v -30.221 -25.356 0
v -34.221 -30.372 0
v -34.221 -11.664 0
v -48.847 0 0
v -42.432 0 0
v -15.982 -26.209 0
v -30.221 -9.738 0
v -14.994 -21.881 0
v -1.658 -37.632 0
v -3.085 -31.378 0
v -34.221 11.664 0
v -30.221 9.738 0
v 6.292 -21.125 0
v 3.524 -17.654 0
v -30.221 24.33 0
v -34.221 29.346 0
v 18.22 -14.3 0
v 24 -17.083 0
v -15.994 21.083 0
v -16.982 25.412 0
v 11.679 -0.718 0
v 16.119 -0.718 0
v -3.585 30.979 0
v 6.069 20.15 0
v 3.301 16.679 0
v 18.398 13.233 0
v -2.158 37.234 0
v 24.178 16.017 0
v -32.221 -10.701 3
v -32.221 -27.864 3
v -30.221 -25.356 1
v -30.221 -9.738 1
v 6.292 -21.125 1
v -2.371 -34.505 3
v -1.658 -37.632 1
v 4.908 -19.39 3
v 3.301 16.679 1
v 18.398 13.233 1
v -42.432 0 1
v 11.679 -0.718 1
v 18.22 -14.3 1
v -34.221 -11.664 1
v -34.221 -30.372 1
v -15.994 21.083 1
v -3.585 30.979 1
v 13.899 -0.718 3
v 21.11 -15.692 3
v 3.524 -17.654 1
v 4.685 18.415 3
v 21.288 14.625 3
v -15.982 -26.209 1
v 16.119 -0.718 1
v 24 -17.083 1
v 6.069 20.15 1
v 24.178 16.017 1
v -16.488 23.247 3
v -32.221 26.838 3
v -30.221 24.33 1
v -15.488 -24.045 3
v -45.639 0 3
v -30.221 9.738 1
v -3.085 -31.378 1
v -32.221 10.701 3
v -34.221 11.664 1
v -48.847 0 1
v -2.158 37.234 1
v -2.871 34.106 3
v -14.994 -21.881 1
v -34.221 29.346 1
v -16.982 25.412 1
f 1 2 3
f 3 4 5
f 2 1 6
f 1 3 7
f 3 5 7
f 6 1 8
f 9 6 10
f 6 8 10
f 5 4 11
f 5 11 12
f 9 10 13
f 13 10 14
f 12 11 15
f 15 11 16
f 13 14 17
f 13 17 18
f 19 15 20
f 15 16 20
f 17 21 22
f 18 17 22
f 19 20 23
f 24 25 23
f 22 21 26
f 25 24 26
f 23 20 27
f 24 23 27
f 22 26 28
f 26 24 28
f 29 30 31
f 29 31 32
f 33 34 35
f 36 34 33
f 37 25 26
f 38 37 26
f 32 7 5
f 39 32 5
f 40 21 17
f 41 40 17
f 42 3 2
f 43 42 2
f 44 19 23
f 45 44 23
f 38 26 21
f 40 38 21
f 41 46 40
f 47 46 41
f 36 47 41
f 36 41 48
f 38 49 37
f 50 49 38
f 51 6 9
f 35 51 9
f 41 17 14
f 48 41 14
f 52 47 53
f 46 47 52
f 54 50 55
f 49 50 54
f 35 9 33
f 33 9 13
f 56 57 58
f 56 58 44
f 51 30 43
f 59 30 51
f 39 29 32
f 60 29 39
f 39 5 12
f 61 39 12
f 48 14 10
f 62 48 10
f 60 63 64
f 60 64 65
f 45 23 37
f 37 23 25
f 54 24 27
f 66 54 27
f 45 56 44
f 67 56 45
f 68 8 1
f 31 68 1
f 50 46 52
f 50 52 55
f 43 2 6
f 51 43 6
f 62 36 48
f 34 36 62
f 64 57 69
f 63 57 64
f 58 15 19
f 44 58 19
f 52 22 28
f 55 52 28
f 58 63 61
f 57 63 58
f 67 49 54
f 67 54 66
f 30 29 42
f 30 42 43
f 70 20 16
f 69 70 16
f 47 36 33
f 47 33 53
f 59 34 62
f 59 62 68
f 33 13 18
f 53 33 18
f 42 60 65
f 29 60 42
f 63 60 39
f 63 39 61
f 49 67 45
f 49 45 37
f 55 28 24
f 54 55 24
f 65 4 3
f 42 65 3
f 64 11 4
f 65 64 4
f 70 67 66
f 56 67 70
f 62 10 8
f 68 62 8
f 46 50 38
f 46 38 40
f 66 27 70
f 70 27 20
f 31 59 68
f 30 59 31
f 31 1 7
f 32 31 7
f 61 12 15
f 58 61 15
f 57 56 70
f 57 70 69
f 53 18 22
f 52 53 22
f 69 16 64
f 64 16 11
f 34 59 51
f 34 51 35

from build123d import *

# Parameters (mm, degrees)
F1_DEPTH = 3
F2_SIZE  = 1.99999


# Not quite as in the source:
# - a fillet or chamfer is up to 0.001 mm smaller than in the source, because OpenCascade refuses the exact size


with BuildPart() as f1:
    # F0 (on Top) → F1 (new body)
    with BuildSketch(Plane.XY):
        Polygon((6.0692586303, 20.150212978), (-2.1576516057, 37.2335681107), (-16.982031609, 25.4115195514), (-34.2207515071, 29.346144875), (-34.2207515071, 11.6640991742), (-48.8470692461, 0), (-34.2207515071, -11.6640991742), (-34.2207515071, -30.3718617382), (-15.982031609, -26.2089929403), (-1.6576516057, -37.6323048051), (6.2917795642, -21.1251408902), (24, -17.0833551327), (16.1191004999, -0.7184986964), (24.1784479339, 16.0169086929), align=None)
        Polygon((-42.4315673597, 0), (-30.2207515071, 9.737800699), (-30.2207515071, 24.3303035243), (-15.9941131941, 21.0831661669), (-3.5852350773, 30.9789162509), (3.3011727437, 16.6791430651), (18.3982804623, 13.2333267461), (11.6794354432, -0.7184986964), (18.2198325283, -14.2997731858), (3.5236936777, -17.6540709772), (-3.0852350773, -31.3776529454), (-14.9941131941, -21.8806395557), (-30.2207515071, -25.3560203876), (-30.2207515071, -9.737800699), align=None, mode=Mode.SUBTRACT)
    extrude(amount=F1_DEPTH)

    # F2 (size 2 in the source; OpenCascade refuses exactly that, so slightly less here)
    f2_edges = [f1.edges().sort_by_distance(p)[0] for p in [
        (15.123853, 18.083561, 3),
        (1.955804, 28.691891, 3),
        (-9.569842, 31.322544, 3),
        (-25.601392, 27.378832, 3),
        (-34.220752, 20.505122, 3),
        (-41.53391, 5.83205, 3),
        (-41.53391, -5.83205, 3),
        (-34.220752, -21.01798, 3),
        (-25.101392, -28.290427, 3),
        (-8.819842, -31.920649, 3),
        (2.317064, -29.378723, 3),
        (15.14589, -19.104248, 3),
        (20.05955, -8.900927, 3),
        (20.148774, 7.649205, 3),
        (-9.039674, -26.629146, 3),
        (-22.607432, -23.61833, 3),
        (-30.220752, -17.546911, 3),
        (-36.326159, -4.8689, 3),
        (-36.326159, 4.8689, 3),
        (-30.220752, 17.034052, 3),
        (-23.107432, 22.706735, 3),
        (-9.789674, 26.031041, 3),
        (-0.142031, 23.82903, 3),
        (10.849727, 14.956235, 3),
        (15.038858, 6.257414, 3),
        (14.949634, -7.509136, 3),
        (10.871763, -15.976922, 3),
        (0.219229, -24.515862, 3),
    ]]
    chamfer(f2_edges, length=F2_SIZE)


solid = f1.part
